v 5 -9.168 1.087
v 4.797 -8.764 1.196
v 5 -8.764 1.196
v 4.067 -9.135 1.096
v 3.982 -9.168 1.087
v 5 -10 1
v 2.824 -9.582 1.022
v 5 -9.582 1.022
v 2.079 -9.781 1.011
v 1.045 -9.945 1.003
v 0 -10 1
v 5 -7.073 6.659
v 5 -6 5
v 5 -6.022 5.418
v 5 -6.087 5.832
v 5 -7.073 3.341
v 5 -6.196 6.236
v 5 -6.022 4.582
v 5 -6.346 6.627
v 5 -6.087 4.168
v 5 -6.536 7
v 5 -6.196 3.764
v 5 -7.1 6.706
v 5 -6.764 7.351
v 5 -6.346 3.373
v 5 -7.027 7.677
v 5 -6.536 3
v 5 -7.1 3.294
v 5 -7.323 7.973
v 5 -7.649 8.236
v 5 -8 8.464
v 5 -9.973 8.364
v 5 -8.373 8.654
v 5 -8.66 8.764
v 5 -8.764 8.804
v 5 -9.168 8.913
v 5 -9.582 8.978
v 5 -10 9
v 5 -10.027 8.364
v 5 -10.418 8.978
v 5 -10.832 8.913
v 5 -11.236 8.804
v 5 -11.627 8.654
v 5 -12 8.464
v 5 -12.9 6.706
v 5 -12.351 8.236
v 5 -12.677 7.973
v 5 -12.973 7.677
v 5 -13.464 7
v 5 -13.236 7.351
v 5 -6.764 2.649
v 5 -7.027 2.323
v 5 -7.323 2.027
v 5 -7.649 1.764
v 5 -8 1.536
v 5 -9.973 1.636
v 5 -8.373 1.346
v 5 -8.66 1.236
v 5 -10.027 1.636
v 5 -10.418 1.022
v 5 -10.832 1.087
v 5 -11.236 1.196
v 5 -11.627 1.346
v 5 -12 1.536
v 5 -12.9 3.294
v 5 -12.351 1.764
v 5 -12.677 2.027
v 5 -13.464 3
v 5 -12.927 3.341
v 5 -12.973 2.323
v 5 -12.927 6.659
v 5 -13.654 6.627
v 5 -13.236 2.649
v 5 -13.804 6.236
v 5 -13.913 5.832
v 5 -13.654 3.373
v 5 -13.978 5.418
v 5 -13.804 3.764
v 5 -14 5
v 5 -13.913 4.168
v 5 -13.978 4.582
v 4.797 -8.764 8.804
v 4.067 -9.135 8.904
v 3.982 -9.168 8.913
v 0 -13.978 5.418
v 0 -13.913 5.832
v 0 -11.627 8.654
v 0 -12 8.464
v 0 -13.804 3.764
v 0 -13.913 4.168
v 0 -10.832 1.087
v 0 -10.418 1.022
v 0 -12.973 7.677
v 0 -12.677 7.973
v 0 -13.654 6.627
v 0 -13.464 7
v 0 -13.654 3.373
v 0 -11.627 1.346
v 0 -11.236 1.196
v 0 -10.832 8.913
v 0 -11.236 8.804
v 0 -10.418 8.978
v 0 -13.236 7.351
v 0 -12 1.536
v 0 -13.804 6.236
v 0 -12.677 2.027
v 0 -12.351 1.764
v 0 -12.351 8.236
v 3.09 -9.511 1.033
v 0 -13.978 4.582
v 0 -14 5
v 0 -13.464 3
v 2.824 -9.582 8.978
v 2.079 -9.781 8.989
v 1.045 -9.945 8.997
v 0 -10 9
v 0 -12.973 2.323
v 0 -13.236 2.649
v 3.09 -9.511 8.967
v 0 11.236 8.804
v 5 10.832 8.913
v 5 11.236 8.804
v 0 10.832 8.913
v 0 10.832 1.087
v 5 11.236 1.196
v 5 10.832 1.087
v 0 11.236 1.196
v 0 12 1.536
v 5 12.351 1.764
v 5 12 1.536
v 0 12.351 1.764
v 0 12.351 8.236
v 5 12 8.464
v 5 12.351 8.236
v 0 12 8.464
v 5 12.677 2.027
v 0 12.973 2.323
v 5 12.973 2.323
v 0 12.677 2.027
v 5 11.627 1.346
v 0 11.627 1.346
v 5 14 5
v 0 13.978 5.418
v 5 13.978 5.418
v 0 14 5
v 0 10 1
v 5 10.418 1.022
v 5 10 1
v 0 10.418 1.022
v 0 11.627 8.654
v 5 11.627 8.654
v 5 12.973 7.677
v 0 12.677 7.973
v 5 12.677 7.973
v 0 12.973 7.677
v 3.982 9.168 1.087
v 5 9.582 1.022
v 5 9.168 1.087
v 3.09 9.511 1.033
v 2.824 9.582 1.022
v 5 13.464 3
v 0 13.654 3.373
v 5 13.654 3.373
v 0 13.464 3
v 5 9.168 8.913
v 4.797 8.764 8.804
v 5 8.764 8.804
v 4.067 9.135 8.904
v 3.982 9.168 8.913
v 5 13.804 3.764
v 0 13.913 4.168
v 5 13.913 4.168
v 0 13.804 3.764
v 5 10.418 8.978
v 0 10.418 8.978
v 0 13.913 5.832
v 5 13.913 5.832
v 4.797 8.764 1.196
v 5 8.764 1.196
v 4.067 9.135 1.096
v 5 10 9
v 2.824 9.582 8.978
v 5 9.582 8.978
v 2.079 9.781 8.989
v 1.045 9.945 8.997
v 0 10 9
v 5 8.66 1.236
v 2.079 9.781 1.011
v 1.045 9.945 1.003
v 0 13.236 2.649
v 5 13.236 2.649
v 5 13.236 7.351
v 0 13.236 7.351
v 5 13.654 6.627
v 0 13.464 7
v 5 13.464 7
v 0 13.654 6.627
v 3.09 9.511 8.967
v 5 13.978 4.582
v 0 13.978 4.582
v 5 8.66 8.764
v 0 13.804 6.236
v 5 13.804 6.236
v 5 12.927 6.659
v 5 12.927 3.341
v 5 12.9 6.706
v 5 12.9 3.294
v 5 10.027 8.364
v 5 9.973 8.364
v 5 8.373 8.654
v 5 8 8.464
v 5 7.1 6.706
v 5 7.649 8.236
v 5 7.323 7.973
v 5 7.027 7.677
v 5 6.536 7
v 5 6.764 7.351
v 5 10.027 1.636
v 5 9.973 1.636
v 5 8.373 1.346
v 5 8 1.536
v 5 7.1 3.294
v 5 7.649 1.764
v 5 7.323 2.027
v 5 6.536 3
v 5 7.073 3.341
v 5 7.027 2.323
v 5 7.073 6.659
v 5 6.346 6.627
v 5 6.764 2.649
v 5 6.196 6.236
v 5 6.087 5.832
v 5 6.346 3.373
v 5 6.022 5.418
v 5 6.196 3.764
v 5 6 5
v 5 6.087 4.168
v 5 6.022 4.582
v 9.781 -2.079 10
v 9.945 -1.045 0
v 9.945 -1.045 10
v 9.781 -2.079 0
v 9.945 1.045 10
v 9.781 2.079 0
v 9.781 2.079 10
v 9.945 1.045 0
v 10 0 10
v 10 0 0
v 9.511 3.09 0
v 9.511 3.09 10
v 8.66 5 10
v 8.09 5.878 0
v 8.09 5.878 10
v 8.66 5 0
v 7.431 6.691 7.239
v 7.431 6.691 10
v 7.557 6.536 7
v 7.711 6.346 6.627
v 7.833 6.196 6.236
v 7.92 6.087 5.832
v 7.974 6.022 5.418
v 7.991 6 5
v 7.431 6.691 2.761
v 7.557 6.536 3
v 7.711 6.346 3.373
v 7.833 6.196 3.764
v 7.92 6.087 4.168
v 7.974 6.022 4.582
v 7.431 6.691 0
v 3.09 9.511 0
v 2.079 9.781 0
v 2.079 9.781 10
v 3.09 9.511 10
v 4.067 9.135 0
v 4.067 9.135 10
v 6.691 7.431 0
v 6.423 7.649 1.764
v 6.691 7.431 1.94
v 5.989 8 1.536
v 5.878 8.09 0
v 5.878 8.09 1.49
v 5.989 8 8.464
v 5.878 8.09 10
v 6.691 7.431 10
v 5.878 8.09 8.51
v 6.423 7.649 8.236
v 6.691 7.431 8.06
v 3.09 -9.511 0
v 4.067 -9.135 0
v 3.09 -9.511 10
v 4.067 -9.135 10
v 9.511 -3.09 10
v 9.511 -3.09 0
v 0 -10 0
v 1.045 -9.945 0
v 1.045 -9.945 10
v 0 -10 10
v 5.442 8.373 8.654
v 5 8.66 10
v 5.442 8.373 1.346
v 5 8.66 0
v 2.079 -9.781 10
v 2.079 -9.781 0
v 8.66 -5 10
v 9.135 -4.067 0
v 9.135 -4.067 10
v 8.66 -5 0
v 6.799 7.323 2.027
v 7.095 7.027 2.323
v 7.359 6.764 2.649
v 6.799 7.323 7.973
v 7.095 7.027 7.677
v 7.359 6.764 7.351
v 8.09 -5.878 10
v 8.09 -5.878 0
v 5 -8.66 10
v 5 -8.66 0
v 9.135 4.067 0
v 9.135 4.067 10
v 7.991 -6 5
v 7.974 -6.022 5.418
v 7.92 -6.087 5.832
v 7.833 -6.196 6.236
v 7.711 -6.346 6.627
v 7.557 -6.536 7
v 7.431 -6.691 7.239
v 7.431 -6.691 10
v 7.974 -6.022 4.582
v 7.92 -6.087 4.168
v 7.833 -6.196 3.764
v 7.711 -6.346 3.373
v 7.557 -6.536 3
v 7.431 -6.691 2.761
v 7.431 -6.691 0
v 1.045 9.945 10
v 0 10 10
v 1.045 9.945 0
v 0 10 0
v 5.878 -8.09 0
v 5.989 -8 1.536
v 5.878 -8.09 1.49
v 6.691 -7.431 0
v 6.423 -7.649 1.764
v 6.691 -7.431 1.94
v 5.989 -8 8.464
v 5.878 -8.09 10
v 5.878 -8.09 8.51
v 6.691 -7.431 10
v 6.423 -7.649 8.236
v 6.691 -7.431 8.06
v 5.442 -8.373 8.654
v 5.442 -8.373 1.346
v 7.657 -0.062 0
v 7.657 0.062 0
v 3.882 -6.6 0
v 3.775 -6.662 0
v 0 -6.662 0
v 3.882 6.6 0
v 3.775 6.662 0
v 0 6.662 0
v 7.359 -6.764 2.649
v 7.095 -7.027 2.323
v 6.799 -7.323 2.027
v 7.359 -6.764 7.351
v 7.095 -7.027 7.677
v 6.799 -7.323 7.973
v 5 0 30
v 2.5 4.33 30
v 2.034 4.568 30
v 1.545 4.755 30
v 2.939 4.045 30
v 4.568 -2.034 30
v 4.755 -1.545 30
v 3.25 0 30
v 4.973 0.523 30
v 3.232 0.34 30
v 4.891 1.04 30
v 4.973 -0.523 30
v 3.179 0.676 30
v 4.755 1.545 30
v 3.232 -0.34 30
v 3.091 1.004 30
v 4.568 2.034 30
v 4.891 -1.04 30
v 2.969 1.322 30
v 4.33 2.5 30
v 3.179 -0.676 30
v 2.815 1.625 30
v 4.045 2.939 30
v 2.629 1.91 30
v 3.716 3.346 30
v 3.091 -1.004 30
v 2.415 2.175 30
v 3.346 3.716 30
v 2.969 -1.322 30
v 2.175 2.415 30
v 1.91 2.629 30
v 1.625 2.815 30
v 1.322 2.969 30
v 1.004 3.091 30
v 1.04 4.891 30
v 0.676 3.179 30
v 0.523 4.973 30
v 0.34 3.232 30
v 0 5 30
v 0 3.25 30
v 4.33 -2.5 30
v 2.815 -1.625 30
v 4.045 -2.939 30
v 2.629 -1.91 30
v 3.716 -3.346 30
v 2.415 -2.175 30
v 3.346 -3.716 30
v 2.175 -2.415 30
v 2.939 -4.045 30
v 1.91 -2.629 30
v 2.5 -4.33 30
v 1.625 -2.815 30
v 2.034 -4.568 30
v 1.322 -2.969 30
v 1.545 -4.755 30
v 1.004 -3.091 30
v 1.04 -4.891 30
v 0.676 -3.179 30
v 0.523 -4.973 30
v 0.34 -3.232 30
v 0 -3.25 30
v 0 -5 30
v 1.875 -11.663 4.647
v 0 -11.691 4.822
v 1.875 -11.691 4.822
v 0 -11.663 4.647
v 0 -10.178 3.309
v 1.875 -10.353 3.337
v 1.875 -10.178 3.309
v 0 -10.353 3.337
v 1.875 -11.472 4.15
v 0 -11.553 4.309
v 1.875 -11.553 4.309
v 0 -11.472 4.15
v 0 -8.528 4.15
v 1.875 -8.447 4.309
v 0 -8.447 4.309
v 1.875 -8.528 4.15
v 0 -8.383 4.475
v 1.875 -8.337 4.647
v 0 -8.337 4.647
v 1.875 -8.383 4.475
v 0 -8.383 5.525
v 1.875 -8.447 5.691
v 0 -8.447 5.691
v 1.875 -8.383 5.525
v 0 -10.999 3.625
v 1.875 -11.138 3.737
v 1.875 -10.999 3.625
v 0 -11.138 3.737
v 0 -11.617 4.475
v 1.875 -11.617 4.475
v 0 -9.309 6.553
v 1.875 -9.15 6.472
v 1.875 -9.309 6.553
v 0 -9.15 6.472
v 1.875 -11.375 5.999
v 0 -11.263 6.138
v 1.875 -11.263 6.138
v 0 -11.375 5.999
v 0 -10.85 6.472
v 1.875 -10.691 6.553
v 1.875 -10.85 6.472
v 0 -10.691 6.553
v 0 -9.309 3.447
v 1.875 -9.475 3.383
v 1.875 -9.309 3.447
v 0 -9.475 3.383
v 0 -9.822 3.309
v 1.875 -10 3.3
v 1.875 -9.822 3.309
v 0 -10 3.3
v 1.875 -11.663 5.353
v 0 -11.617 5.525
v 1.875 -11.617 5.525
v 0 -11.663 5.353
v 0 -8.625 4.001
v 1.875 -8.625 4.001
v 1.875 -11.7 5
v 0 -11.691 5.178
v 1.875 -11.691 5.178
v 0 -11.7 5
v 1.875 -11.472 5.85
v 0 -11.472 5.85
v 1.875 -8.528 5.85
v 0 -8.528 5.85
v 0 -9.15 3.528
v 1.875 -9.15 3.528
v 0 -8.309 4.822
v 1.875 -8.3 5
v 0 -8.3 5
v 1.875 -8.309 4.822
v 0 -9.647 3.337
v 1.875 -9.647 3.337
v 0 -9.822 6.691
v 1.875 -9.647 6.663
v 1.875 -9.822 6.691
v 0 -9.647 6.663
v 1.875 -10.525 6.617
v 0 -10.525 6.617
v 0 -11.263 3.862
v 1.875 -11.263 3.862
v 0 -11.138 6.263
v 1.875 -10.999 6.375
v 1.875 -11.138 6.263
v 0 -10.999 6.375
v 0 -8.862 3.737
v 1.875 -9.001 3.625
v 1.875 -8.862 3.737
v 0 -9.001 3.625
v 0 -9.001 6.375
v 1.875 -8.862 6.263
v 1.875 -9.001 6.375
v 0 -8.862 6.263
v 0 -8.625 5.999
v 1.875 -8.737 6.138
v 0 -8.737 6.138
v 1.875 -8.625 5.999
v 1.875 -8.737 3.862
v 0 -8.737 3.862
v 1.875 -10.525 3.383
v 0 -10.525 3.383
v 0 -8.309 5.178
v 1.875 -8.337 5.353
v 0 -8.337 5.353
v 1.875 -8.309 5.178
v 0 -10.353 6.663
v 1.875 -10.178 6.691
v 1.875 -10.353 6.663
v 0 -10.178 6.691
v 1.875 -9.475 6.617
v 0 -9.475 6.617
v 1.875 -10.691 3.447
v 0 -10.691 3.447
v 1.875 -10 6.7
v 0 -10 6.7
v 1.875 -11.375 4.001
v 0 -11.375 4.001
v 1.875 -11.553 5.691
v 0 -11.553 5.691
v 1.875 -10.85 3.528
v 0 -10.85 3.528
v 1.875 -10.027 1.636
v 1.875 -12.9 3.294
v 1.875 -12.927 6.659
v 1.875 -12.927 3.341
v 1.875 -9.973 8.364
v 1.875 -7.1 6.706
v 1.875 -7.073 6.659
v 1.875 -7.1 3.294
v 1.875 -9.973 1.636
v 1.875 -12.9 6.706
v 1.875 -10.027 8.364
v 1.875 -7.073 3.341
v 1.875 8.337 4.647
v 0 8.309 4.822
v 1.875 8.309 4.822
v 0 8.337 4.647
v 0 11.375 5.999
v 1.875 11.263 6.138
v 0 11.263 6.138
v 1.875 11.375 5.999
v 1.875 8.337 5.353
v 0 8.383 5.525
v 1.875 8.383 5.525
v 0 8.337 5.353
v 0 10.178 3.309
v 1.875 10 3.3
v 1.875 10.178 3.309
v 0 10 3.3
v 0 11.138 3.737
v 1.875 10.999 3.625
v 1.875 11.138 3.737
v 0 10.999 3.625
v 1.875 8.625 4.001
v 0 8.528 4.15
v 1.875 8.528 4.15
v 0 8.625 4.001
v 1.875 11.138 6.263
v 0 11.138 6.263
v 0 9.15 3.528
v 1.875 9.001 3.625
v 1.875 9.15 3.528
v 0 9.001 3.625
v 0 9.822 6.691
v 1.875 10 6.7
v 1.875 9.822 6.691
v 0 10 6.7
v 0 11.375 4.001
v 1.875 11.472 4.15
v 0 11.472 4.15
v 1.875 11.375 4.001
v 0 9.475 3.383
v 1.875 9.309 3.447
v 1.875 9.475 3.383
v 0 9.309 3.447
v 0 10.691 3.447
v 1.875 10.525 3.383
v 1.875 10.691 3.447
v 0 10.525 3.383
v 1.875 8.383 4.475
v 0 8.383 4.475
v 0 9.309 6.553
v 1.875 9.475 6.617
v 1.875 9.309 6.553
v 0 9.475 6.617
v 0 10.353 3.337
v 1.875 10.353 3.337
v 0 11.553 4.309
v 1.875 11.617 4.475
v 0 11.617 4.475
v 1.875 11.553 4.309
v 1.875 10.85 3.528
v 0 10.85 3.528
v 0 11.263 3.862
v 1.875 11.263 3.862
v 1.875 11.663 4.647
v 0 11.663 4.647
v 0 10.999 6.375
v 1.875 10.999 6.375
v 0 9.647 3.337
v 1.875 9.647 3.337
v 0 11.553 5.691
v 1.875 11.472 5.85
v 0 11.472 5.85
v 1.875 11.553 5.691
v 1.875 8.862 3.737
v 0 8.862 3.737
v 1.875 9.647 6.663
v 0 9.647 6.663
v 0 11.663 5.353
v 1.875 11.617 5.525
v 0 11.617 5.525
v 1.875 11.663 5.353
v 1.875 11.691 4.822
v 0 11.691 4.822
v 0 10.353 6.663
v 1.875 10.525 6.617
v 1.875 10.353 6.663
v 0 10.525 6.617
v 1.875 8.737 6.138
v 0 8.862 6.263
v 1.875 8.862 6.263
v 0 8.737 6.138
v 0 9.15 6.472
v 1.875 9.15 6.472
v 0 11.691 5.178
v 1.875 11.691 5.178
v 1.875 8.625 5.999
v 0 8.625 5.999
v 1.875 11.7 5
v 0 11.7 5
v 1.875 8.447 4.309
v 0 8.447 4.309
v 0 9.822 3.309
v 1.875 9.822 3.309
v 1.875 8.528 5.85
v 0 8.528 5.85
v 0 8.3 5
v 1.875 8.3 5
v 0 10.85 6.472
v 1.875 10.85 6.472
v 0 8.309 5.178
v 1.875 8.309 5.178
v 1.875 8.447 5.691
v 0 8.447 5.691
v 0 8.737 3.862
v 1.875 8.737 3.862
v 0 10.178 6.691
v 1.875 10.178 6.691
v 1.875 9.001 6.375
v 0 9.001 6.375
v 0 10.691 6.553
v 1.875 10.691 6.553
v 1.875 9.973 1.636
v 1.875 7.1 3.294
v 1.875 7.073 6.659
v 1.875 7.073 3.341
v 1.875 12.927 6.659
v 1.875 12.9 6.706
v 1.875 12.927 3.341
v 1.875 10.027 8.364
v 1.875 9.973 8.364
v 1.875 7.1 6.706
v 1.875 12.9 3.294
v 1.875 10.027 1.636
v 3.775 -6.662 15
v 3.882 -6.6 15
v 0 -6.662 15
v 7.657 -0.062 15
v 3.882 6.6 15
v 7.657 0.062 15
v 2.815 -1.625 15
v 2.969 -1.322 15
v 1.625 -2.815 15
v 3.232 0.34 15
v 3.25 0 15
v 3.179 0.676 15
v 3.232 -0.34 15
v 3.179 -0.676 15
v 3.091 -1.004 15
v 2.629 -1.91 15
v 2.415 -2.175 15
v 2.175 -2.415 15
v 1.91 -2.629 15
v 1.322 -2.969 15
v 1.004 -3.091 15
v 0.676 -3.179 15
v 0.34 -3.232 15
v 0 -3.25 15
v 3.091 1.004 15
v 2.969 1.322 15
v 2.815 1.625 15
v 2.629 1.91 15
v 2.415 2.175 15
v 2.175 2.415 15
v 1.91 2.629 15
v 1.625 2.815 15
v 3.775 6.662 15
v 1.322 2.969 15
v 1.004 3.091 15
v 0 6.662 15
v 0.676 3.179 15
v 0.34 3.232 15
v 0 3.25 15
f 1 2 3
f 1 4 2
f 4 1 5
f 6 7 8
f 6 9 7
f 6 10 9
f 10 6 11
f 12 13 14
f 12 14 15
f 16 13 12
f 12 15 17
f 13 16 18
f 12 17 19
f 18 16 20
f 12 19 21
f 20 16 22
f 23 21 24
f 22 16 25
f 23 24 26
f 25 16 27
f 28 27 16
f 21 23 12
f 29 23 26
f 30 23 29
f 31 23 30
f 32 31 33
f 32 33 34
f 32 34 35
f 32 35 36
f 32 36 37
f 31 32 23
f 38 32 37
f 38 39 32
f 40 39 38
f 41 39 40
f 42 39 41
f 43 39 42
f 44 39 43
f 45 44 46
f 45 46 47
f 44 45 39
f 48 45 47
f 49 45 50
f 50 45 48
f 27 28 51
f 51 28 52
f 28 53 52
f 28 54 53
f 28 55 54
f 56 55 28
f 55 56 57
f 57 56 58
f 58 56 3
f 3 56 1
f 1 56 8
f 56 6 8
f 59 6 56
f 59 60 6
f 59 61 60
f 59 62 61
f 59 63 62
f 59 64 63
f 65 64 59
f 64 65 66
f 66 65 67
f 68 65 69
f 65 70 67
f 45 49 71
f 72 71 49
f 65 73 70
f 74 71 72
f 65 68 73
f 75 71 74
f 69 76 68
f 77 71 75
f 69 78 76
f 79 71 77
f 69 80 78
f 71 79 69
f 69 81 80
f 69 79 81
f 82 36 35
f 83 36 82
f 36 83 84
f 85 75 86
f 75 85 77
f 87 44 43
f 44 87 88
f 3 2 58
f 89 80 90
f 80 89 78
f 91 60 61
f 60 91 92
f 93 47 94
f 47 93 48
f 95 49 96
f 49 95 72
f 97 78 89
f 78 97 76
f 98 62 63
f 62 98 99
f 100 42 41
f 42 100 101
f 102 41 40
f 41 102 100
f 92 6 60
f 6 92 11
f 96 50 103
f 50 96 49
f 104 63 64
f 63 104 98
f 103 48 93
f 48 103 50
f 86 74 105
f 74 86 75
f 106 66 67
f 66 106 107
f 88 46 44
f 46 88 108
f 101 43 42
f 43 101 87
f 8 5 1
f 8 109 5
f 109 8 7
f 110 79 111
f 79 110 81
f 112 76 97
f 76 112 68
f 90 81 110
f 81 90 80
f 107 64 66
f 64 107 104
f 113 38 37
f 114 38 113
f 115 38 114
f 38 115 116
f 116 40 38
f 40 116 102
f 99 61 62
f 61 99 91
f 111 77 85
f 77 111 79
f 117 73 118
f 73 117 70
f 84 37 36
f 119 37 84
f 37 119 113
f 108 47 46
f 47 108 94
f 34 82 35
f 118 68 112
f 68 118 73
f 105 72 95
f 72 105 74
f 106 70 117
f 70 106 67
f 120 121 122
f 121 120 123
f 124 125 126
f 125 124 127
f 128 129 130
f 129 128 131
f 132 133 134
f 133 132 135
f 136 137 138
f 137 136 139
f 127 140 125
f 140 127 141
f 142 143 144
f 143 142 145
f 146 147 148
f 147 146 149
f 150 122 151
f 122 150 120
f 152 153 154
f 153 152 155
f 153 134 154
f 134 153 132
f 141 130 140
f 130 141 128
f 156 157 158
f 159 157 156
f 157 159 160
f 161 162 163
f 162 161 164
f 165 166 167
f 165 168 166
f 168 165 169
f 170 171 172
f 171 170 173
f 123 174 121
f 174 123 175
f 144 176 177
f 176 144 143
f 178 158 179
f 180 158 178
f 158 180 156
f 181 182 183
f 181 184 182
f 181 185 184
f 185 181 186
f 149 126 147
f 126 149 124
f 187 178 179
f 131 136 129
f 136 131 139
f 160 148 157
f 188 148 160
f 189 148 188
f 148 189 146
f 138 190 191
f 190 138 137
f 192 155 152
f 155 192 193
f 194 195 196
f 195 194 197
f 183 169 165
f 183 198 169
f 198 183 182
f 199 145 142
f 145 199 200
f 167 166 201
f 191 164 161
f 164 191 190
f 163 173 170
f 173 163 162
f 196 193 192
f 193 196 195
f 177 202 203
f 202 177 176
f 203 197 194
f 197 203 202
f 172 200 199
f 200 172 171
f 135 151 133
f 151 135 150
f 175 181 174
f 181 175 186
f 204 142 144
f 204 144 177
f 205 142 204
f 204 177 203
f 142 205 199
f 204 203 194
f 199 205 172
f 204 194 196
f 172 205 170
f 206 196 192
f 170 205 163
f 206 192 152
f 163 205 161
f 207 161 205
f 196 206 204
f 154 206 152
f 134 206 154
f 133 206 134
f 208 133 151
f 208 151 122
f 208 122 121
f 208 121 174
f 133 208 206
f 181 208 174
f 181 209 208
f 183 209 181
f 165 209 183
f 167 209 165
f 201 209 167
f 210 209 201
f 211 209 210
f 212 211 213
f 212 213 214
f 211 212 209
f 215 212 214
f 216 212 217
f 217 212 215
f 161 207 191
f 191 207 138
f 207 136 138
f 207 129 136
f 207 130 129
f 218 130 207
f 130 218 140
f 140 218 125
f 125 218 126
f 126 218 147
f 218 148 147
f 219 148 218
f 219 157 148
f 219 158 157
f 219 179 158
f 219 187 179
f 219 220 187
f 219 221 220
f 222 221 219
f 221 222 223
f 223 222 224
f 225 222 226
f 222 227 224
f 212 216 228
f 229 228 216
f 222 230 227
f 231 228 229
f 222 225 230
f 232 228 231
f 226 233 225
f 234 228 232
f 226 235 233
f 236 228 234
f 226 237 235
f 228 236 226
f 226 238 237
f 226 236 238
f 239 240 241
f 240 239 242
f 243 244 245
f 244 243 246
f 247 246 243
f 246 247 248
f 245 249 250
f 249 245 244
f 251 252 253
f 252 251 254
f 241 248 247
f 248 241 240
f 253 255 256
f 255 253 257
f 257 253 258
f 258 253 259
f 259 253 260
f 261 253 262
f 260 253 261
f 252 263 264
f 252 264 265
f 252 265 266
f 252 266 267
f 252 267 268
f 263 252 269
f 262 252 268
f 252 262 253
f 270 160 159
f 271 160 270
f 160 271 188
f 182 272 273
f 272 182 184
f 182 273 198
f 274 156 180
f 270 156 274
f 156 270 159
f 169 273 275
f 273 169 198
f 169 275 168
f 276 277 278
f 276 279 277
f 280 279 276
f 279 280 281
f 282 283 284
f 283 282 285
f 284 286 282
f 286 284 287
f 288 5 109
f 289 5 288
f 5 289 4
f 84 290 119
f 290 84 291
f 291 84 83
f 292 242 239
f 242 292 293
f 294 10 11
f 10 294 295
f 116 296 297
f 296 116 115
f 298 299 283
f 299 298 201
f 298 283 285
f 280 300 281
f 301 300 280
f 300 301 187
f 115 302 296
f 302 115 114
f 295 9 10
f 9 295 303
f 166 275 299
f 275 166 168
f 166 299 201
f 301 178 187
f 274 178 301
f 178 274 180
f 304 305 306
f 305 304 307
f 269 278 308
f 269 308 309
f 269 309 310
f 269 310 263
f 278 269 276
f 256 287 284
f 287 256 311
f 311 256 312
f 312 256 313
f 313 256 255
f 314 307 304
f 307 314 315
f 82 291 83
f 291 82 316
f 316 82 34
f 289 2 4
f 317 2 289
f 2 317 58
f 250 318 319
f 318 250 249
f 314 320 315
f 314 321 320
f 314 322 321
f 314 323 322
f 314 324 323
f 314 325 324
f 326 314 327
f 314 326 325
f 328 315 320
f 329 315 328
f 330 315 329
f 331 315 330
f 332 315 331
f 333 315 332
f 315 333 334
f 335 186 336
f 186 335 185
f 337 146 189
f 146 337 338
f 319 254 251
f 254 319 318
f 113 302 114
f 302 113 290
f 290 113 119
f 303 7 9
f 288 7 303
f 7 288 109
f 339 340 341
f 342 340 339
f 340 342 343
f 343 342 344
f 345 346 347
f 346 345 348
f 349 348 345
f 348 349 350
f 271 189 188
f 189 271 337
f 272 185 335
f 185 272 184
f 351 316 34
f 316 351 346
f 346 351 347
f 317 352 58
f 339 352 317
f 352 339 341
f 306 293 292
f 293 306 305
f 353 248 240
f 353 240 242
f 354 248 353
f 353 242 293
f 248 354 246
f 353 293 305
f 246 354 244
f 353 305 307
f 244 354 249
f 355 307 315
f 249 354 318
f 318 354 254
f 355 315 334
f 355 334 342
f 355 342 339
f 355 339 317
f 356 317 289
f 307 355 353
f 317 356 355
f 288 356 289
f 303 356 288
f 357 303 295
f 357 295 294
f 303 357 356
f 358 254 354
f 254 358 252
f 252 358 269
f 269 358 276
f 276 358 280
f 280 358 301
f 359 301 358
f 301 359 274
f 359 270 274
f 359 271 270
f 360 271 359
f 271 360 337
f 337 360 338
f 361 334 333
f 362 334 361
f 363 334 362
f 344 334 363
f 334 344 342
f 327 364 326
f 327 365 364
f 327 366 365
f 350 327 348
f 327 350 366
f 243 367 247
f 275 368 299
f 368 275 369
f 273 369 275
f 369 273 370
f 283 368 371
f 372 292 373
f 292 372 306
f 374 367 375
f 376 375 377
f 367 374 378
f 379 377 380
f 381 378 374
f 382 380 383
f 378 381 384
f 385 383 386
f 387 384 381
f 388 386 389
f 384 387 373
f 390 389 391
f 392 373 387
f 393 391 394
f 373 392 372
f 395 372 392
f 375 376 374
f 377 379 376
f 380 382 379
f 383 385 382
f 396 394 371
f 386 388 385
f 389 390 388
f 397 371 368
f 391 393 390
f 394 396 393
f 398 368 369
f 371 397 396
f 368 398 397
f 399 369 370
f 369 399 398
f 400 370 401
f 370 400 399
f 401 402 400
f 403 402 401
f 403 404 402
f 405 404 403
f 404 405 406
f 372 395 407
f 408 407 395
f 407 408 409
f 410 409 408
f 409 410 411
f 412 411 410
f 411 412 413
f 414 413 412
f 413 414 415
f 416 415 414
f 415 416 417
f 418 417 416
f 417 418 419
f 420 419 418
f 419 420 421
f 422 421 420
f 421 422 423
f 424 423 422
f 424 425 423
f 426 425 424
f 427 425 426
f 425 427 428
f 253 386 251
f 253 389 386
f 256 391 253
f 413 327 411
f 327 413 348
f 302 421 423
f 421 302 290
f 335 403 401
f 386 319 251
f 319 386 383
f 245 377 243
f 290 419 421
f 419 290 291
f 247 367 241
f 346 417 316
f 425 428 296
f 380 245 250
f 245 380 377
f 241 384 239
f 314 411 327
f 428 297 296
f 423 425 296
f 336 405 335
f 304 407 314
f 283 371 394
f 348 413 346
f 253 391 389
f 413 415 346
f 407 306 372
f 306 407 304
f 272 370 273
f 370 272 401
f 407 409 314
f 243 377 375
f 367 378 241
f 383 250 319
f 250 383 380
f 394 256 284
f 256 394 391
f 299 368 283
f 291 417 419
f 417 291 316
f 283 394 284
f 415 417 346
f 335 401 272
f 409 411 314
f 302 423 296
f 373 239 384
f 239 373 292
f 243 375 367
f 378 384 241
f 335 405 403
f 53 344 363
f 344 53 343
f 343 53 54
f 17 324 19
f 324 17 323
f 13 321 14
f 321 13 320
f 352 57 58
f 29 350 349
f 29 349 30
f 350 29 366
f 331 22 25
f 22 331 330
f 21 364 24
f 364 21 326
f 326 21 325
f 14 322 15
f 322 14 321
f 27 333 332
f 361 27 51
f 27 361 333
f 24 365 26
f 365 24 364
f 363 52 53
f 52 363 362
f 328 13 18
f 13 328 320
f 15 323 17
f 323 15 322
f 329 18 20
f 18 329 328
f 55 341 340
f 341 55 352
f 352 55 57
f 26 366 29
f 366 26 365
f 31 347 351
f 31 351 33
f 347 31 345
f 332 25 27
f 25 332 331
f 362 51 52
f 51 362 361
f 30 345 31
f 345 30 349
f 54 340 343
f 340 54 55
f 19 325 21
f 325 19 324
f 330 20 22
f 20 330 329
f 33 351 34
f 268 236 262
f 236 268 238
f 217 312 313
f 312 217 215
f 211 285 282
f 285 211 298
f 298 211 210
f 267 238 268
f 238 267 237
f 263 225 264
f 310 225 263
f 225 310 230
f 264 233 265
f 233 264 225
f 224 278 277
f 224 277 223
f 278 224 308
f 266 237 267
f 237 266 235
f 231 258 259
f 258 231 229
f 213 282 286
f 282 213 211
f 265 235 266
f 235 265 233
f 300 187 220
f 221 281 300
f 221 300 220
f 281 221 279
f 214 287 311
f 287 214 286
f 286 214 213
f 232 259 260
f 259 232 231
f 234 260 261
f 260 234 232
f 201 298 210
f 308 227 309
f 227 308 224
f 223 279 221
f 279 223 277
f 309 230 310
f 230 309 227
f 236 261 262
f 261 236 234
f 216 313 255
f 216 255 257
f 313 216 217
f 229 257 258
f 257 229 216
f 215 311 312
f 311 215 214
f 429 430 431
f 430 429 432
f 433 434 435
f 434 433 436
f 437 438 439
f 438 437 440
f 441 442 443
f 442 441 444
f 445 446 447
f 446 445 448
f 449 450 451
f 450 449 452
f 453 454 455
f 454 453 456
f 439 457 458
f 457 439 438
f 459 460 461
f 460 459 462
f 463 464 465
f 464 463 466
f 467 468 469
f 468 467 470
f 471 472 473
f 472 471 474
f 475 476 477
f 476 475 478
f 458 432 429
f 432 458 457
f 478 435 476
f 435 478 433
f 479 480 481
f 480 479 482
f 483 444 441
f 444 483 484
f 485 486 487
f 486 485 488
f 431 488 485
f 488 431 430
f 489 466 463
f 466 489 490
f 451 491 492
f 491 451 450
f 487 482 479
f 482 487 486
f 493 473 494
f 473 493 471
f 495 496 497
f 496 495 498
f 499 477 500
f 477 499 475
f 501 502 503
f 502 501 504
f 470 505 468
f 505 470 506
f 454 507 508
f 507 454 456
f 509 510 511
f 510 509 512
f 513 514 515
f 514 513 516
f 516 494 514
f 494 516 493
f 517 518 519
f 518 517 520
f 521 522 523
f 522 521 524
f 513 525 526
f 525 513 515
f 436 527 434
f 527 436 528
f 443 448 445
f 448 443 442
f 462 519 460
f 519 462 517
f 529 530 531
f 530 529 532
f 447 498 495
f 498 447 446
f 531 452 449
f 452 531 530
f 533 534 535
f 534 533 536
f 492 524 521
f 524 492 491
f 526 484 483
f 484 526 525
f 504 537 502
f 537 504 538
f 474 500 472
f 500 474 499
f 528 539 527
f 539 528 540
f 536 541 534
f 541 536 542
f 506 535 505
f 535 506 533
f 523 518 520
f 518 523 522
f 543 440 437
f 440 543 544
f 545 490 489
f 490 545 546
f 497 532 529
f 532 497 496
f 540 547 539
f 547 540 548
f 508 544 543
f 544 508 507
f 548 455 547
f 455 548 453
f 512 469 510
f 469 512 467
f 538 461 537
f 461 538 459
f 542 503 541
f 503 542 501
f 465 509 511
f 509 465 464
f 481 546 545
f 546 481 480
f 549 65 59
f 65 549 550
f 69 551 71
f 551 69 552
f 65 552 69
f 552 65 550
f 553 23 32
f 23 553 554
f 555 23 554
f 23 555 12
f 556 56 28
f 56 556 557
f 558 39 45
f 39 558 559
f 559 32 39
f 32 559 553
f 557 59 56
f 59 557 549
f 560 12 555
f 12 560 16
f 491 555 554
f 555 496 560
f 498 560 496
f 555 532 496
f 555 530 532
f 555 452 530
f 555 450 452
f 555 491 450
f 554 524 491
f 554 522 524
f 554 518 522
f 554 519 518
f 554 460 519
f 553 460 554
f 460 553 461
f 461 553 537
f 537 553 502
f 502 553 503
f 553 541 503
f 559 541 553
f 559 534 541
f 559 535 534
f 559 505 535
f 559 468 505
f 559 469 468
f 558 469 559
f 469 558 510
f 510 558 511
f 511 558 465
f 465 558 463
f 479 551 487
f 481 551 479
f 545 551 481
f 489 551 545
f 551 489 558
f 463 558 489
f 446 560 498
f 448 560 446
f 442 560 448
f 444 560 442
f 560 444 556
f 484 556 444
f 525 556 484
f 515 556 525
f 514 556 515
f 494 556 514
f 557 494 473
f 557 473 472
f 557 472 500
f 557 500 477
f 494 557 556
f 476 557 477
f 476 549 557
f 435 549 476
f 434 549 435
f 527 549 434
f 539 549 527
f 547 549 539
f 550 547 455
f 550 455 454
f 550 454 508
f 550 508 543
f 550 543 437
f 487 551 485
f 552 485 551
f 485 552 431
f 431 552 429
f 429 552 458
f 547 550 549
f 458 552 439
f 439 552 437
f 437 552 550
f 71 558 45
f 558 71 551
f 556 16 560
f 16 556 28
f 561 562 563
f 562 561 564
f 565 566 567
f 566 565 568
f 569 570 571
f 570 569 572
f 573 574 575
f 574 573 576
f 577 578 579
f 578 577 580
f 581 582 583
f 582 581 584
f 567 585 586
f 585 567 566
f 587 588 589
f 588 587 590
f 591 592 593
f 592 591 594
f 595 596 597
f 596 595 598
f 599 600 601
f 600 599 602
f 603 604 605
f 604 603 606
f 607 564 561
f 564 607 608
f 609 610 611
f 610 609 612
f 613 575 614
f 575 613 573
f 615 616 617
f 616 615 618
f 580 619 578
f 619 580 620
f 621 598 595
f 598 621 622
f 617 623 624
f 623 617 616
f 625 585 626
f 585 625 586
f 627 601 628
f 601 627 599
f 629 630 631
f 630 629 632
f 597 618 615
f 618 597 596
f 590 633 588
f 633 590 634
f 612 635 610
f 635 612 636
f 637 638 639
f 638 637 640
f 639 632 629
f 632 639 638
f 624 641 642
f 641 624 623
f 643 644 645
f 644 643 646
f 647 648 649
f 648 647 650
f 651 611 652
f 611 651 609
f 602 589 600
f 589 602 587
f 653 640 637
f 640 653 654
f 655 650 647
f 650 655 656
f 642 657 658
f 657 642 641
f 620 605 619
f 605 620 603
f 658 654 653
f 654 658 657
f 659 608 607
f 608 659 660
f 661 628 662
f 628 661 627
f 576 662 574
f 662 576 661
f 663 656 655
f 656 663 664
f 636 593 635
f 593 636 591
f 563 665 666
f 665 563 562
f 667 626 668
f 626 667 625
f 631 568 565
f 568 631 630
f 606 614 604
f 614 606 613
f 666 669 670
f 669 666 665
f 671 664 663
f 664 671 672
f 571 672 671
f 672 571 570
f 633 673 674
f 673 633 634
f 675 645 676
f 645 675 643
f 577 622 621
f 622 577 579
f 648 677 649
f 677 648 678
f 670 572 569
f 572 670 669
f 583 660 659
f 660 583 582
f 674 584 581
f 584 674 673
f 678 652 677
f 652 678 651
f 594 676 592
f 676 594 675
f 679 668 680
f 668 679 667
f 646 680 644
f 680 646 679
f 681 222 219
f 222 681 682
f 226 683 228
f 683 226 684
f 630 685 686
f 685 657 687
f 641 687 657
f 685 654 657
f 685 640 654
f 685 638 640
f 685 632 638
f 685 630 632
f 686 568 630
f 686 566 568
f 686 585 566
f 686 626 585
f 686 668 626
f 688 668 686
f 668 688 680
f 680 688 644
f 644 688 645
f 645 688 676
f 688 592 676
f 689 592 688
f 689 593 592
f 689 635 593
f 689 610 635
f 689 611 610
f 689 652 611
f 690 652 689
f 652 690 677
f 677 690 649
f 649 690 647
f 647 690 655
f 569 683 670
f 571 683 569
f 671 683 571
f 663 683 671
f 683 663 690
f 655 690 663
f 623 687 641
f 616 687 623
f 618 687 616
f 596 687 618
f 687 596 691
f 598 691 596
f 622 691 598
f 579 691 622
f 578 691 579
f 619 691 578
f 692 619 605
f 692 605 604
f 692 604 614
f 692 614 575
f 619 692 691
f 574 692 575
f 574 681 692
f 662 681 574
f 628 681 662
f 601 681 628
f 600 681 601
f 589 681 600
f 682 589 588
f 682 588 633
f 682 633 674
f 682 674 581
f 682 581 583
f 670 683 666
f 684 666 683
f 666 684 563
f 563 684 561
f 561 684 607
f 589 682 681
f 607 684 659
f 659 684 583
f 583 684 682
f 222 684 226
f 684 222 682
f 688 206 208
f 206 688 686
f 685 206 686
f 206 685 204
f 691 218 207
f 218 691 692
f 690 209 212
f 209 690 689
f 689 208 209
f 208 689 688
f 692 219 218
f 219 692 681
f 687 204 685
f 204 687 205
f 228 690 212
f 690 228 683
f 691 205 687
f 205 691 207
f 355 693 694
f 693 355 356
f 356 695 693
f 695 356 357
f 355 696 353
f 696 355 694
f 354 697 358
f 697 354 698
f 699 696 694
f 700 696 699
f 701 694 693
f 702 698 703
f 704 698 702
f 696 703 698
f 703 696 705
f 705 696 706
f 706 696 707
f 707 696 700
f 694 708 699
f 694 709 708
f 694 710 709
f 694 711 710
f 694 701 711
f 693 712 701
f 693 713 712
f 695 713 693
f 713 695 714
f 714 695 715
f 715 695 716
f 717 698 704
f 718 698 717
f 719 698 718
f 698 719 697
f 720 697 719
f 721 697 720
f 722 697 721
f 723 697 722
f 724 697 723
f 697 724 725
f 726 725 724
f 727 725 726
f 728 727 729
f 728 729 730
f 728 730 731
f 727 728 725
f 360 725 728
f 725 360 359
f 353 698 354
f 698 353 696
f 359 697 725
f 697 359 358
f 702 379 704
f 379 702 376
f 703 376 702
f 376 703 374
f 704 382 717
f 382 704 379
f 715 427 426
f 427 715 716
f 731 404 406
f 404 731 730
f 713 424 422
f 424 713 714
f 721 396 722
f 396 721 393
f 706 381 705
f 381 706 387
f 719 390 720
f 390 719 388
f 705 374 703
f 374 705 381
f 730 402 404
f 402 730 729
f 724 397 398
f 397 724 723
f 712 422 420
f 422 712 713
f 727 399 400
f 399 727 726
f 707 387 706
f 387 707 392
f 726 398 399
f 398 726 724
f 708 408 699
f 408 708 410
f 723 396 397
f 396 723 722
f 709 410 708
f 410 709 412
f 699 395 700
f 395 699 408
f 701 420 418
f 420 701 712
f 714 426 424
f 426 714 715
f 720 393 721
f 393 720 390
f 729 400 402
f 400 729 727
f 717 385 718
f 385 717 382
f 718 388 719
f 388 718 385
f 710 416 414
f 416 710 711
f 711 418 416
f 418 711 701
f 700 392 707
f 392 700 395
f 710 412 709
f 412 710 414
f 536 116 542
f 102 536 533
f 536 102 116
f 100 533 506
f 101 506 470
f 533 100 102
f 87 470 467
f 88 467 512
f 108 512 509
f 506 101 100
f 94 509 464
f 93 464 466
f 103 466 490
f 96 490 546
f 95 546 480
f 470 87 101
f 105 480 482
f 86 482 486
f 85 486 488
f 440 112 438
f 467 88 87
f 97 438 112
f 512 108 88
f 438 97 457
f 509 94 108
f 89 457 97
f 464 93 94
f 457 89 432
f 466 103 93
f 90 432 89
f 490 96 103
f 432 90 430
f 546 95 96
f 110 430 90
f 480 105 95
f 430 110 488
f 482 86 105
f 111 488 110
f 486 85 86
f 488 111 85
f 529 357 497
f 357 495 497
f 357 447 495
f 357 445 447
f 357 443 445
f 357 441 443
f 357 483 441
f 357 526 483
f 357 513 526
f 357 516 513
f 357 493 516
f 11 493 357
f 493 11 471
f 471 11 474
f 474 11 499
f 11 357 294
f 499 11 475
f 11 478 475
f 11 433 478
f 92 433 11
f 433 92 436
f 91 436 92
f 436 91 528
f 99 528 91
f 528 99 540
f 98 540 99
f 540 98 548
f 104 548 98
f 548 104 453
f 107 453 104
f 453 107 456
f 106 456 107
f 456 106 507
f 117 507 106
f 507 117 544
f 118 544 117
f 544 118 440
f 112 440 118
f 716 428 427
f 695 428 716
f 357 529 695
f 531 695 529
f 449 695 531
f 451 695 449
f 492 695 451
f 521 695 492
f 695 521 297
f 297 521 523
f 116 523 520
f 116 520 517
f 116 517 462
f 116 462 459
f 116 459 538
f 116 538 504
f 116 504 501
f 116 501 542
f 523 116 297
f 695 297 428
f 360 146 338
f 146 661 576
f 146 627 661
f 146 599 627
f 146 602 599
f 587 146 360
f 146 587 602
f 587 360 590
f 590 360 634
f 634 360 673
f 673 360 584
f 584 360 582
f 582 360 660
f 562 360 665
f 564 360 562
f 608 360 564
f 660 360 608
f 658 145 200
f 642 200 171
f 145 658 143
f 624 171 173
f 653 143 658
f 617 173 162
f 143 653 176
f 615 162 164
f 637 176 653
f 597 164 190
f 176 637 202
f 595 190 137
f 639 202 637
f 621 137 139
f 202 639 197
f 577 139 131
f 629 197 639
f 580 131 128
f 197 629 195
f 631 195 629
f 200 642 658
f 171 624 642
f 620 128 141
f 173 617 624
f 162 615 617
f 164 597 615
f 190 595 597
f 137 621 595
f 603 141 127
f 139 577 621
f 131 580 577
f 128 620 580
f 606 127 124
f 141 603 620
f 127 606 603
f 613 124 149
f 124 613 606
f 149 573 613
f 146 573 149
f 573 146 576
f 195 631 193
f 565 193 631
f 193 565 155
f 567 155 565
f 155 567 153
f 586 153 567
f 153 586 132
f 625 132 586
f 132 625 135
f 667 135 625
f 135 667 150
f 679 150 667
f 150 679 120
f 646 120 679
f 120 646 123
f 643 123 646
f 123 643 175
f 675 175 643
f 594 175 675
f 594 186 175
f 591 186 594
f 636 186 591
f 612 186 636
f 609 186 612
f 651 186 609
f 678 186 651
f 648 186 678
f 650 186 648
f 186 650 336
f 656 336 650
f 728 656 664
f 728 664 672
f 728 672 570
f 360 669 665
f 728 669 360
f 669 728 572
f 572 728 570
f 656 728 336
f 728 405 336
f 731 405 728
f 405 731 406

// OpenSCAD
$fn=60;


//stress_support();
//stress_support(side=1);
//inner();
hose_support();


module hose_support(side=2){
    difference(){
        union(){
            translate([0,0,0]) cylinder(d=20, h=10);
            translate([0,0,10]) cylinder(d1=20, d2=10, h=20);
            
            for(Y=[-1,1])
            translate([0,10*Y,5]) rotate([0,90,0]) 
                cylinder(d=8, h=10, center=true);
        }
        translate([0,0,7.5]) fhex(wid=13.2,height=15);
        translate([0,0,0]) cylinder(d=6.5, h=50);
        
        for(Y=[-1,1]){
            translate([0,10*Y,5]) rotate([0,90,0]) 
                cylinder(d=3.4, h=20, center=true);
            for(X=[-1,1])
            translate([10*X,10*Y,5]) rotate([0,90,0]) 
                cylinder(d=8, h=10, center=true);
            
            translate([3.5,10*Y,5]) rotate([0,90,0]) 
                fhex(wid=m3_hex_nut+0.2,height=m3_nut_height+1);
        }
        if( side == 1 ){
            translate([0,-15,-50]) cube([20,30,100]);
        }
        else if( side == 2 ){
            translate([-20,-15,-50]) cube([20,30,100]);
        }
    }
}

module inner(){
    translate([0,0,5]) cylinder(d=10.85, h=20);
    fhex(wid=13,height=10.6);
    translate([0,0,-25]) cylinder(d=6.5, h=20);
}

module stress_support(side=2){
    difference(){
        union(){
            translate([0,0,-25]) cylinder(d1=10, d2=25, h=20);
            translate([0,0,-5]) cylinder(d=25, h=30);
            translate([0,0,25]) cylinder(d1=25, d2=15, h=10);
            for(Y=[-1,1]) translate([0,10*Y,0]) rotate([0,90,0])
                cylinder(d=7, h=15, center=true);
            for(Y=[-1,1], Z=[10,20]) translate([0,9*Y,Z])
                rotate([0,90,0]) 
                cylinder(d=7, h=15, center=true);
            for(Y=[-1,1]) translate([0,6*Y,-10]){
                translate([5,0,0]) rotate([0,90,0]) 
                    cylinder(d=8, h=8, center=true);
                rotate([0,90,0]) 
                    cylinder(d=7, h=15, center=true);
            }
        }
        translate([0,0,-5]) cylinder(d=10.95, h=50);
        fhex(wid=13.2,height=10.6);
        translate([0,0,-60]) cylinder(d=6.5, h=75);
        if( side == 1 ){
            translate([0,-15,-50]) cube([20,30,100]);
        }
        else if( side == 2 ){
            translate([-20,-15,-50]) cube([20,30,100]);
        }
        for(Y=[-1,1]) translate([0,10*Y,0]){
            rotate([0,90,0]) cylinder(d=3.4, h=100, center=true);
            translate([8,0,0]) rotate([0,90,0]) 
                fhex(wid=m3_hex_nut+0.2,height=m3_nut_height*3);
        }
        for(Y=[-1,1], Z=[10,20]) translate([0,9*Y,Z]){
            rotate([0,90,0]) cylinder(d=3.4, h=100, center=true);
            translate([8,0,0]) rotate([0,90,0]) 
                fhex(wid=m3_hex_nut+0.2,height=m3_nut_height*3);
        }
        for(Y=[-1,1]) translate([0,6*Y,-10]){
            rotate([0,90,0]) cylinder(d=3.4, h=100, center=true);
            translate([-10,0,0]) rotate([0,90,0]) 
                cylinder(d=7, h=5, center=true);
            translate([10,0,0]) rotate([0,90,0]) 
                fhex(wid=m3_hex_nut+0.2,height=m3_nut_height*3);
            translate([11.5,0,0]) rotate([0,90,0]) 
                cylinder(d=8, h=5, center=true);
        }
        for(Y=[-1,1], X=[-1,1]) translate([10*X,10*Y,0]) rotate([0,90,0])
            cylinder(d=7, h=5, center=true);
        for(Y=[-1,1], X=[-1,1], Z=[10,20]) translate([10*X,9*Y,Z])
            rotate([0,90,0]) 
            cylinder(d=7, h=5, center=true);
    }
}

m3_hex_nut=5.6;
m3_nut_height=2.25;

module fhex(wid,height){
  hull(){
    cube([wid/1.7,wid,height],center=true);
    rotate([0,0,120]) cube([wid/1.7,wid,height], center=true);
    rotate([0,0,240]) cube([wid/1.7,wid,height], center=true);
  }
}
